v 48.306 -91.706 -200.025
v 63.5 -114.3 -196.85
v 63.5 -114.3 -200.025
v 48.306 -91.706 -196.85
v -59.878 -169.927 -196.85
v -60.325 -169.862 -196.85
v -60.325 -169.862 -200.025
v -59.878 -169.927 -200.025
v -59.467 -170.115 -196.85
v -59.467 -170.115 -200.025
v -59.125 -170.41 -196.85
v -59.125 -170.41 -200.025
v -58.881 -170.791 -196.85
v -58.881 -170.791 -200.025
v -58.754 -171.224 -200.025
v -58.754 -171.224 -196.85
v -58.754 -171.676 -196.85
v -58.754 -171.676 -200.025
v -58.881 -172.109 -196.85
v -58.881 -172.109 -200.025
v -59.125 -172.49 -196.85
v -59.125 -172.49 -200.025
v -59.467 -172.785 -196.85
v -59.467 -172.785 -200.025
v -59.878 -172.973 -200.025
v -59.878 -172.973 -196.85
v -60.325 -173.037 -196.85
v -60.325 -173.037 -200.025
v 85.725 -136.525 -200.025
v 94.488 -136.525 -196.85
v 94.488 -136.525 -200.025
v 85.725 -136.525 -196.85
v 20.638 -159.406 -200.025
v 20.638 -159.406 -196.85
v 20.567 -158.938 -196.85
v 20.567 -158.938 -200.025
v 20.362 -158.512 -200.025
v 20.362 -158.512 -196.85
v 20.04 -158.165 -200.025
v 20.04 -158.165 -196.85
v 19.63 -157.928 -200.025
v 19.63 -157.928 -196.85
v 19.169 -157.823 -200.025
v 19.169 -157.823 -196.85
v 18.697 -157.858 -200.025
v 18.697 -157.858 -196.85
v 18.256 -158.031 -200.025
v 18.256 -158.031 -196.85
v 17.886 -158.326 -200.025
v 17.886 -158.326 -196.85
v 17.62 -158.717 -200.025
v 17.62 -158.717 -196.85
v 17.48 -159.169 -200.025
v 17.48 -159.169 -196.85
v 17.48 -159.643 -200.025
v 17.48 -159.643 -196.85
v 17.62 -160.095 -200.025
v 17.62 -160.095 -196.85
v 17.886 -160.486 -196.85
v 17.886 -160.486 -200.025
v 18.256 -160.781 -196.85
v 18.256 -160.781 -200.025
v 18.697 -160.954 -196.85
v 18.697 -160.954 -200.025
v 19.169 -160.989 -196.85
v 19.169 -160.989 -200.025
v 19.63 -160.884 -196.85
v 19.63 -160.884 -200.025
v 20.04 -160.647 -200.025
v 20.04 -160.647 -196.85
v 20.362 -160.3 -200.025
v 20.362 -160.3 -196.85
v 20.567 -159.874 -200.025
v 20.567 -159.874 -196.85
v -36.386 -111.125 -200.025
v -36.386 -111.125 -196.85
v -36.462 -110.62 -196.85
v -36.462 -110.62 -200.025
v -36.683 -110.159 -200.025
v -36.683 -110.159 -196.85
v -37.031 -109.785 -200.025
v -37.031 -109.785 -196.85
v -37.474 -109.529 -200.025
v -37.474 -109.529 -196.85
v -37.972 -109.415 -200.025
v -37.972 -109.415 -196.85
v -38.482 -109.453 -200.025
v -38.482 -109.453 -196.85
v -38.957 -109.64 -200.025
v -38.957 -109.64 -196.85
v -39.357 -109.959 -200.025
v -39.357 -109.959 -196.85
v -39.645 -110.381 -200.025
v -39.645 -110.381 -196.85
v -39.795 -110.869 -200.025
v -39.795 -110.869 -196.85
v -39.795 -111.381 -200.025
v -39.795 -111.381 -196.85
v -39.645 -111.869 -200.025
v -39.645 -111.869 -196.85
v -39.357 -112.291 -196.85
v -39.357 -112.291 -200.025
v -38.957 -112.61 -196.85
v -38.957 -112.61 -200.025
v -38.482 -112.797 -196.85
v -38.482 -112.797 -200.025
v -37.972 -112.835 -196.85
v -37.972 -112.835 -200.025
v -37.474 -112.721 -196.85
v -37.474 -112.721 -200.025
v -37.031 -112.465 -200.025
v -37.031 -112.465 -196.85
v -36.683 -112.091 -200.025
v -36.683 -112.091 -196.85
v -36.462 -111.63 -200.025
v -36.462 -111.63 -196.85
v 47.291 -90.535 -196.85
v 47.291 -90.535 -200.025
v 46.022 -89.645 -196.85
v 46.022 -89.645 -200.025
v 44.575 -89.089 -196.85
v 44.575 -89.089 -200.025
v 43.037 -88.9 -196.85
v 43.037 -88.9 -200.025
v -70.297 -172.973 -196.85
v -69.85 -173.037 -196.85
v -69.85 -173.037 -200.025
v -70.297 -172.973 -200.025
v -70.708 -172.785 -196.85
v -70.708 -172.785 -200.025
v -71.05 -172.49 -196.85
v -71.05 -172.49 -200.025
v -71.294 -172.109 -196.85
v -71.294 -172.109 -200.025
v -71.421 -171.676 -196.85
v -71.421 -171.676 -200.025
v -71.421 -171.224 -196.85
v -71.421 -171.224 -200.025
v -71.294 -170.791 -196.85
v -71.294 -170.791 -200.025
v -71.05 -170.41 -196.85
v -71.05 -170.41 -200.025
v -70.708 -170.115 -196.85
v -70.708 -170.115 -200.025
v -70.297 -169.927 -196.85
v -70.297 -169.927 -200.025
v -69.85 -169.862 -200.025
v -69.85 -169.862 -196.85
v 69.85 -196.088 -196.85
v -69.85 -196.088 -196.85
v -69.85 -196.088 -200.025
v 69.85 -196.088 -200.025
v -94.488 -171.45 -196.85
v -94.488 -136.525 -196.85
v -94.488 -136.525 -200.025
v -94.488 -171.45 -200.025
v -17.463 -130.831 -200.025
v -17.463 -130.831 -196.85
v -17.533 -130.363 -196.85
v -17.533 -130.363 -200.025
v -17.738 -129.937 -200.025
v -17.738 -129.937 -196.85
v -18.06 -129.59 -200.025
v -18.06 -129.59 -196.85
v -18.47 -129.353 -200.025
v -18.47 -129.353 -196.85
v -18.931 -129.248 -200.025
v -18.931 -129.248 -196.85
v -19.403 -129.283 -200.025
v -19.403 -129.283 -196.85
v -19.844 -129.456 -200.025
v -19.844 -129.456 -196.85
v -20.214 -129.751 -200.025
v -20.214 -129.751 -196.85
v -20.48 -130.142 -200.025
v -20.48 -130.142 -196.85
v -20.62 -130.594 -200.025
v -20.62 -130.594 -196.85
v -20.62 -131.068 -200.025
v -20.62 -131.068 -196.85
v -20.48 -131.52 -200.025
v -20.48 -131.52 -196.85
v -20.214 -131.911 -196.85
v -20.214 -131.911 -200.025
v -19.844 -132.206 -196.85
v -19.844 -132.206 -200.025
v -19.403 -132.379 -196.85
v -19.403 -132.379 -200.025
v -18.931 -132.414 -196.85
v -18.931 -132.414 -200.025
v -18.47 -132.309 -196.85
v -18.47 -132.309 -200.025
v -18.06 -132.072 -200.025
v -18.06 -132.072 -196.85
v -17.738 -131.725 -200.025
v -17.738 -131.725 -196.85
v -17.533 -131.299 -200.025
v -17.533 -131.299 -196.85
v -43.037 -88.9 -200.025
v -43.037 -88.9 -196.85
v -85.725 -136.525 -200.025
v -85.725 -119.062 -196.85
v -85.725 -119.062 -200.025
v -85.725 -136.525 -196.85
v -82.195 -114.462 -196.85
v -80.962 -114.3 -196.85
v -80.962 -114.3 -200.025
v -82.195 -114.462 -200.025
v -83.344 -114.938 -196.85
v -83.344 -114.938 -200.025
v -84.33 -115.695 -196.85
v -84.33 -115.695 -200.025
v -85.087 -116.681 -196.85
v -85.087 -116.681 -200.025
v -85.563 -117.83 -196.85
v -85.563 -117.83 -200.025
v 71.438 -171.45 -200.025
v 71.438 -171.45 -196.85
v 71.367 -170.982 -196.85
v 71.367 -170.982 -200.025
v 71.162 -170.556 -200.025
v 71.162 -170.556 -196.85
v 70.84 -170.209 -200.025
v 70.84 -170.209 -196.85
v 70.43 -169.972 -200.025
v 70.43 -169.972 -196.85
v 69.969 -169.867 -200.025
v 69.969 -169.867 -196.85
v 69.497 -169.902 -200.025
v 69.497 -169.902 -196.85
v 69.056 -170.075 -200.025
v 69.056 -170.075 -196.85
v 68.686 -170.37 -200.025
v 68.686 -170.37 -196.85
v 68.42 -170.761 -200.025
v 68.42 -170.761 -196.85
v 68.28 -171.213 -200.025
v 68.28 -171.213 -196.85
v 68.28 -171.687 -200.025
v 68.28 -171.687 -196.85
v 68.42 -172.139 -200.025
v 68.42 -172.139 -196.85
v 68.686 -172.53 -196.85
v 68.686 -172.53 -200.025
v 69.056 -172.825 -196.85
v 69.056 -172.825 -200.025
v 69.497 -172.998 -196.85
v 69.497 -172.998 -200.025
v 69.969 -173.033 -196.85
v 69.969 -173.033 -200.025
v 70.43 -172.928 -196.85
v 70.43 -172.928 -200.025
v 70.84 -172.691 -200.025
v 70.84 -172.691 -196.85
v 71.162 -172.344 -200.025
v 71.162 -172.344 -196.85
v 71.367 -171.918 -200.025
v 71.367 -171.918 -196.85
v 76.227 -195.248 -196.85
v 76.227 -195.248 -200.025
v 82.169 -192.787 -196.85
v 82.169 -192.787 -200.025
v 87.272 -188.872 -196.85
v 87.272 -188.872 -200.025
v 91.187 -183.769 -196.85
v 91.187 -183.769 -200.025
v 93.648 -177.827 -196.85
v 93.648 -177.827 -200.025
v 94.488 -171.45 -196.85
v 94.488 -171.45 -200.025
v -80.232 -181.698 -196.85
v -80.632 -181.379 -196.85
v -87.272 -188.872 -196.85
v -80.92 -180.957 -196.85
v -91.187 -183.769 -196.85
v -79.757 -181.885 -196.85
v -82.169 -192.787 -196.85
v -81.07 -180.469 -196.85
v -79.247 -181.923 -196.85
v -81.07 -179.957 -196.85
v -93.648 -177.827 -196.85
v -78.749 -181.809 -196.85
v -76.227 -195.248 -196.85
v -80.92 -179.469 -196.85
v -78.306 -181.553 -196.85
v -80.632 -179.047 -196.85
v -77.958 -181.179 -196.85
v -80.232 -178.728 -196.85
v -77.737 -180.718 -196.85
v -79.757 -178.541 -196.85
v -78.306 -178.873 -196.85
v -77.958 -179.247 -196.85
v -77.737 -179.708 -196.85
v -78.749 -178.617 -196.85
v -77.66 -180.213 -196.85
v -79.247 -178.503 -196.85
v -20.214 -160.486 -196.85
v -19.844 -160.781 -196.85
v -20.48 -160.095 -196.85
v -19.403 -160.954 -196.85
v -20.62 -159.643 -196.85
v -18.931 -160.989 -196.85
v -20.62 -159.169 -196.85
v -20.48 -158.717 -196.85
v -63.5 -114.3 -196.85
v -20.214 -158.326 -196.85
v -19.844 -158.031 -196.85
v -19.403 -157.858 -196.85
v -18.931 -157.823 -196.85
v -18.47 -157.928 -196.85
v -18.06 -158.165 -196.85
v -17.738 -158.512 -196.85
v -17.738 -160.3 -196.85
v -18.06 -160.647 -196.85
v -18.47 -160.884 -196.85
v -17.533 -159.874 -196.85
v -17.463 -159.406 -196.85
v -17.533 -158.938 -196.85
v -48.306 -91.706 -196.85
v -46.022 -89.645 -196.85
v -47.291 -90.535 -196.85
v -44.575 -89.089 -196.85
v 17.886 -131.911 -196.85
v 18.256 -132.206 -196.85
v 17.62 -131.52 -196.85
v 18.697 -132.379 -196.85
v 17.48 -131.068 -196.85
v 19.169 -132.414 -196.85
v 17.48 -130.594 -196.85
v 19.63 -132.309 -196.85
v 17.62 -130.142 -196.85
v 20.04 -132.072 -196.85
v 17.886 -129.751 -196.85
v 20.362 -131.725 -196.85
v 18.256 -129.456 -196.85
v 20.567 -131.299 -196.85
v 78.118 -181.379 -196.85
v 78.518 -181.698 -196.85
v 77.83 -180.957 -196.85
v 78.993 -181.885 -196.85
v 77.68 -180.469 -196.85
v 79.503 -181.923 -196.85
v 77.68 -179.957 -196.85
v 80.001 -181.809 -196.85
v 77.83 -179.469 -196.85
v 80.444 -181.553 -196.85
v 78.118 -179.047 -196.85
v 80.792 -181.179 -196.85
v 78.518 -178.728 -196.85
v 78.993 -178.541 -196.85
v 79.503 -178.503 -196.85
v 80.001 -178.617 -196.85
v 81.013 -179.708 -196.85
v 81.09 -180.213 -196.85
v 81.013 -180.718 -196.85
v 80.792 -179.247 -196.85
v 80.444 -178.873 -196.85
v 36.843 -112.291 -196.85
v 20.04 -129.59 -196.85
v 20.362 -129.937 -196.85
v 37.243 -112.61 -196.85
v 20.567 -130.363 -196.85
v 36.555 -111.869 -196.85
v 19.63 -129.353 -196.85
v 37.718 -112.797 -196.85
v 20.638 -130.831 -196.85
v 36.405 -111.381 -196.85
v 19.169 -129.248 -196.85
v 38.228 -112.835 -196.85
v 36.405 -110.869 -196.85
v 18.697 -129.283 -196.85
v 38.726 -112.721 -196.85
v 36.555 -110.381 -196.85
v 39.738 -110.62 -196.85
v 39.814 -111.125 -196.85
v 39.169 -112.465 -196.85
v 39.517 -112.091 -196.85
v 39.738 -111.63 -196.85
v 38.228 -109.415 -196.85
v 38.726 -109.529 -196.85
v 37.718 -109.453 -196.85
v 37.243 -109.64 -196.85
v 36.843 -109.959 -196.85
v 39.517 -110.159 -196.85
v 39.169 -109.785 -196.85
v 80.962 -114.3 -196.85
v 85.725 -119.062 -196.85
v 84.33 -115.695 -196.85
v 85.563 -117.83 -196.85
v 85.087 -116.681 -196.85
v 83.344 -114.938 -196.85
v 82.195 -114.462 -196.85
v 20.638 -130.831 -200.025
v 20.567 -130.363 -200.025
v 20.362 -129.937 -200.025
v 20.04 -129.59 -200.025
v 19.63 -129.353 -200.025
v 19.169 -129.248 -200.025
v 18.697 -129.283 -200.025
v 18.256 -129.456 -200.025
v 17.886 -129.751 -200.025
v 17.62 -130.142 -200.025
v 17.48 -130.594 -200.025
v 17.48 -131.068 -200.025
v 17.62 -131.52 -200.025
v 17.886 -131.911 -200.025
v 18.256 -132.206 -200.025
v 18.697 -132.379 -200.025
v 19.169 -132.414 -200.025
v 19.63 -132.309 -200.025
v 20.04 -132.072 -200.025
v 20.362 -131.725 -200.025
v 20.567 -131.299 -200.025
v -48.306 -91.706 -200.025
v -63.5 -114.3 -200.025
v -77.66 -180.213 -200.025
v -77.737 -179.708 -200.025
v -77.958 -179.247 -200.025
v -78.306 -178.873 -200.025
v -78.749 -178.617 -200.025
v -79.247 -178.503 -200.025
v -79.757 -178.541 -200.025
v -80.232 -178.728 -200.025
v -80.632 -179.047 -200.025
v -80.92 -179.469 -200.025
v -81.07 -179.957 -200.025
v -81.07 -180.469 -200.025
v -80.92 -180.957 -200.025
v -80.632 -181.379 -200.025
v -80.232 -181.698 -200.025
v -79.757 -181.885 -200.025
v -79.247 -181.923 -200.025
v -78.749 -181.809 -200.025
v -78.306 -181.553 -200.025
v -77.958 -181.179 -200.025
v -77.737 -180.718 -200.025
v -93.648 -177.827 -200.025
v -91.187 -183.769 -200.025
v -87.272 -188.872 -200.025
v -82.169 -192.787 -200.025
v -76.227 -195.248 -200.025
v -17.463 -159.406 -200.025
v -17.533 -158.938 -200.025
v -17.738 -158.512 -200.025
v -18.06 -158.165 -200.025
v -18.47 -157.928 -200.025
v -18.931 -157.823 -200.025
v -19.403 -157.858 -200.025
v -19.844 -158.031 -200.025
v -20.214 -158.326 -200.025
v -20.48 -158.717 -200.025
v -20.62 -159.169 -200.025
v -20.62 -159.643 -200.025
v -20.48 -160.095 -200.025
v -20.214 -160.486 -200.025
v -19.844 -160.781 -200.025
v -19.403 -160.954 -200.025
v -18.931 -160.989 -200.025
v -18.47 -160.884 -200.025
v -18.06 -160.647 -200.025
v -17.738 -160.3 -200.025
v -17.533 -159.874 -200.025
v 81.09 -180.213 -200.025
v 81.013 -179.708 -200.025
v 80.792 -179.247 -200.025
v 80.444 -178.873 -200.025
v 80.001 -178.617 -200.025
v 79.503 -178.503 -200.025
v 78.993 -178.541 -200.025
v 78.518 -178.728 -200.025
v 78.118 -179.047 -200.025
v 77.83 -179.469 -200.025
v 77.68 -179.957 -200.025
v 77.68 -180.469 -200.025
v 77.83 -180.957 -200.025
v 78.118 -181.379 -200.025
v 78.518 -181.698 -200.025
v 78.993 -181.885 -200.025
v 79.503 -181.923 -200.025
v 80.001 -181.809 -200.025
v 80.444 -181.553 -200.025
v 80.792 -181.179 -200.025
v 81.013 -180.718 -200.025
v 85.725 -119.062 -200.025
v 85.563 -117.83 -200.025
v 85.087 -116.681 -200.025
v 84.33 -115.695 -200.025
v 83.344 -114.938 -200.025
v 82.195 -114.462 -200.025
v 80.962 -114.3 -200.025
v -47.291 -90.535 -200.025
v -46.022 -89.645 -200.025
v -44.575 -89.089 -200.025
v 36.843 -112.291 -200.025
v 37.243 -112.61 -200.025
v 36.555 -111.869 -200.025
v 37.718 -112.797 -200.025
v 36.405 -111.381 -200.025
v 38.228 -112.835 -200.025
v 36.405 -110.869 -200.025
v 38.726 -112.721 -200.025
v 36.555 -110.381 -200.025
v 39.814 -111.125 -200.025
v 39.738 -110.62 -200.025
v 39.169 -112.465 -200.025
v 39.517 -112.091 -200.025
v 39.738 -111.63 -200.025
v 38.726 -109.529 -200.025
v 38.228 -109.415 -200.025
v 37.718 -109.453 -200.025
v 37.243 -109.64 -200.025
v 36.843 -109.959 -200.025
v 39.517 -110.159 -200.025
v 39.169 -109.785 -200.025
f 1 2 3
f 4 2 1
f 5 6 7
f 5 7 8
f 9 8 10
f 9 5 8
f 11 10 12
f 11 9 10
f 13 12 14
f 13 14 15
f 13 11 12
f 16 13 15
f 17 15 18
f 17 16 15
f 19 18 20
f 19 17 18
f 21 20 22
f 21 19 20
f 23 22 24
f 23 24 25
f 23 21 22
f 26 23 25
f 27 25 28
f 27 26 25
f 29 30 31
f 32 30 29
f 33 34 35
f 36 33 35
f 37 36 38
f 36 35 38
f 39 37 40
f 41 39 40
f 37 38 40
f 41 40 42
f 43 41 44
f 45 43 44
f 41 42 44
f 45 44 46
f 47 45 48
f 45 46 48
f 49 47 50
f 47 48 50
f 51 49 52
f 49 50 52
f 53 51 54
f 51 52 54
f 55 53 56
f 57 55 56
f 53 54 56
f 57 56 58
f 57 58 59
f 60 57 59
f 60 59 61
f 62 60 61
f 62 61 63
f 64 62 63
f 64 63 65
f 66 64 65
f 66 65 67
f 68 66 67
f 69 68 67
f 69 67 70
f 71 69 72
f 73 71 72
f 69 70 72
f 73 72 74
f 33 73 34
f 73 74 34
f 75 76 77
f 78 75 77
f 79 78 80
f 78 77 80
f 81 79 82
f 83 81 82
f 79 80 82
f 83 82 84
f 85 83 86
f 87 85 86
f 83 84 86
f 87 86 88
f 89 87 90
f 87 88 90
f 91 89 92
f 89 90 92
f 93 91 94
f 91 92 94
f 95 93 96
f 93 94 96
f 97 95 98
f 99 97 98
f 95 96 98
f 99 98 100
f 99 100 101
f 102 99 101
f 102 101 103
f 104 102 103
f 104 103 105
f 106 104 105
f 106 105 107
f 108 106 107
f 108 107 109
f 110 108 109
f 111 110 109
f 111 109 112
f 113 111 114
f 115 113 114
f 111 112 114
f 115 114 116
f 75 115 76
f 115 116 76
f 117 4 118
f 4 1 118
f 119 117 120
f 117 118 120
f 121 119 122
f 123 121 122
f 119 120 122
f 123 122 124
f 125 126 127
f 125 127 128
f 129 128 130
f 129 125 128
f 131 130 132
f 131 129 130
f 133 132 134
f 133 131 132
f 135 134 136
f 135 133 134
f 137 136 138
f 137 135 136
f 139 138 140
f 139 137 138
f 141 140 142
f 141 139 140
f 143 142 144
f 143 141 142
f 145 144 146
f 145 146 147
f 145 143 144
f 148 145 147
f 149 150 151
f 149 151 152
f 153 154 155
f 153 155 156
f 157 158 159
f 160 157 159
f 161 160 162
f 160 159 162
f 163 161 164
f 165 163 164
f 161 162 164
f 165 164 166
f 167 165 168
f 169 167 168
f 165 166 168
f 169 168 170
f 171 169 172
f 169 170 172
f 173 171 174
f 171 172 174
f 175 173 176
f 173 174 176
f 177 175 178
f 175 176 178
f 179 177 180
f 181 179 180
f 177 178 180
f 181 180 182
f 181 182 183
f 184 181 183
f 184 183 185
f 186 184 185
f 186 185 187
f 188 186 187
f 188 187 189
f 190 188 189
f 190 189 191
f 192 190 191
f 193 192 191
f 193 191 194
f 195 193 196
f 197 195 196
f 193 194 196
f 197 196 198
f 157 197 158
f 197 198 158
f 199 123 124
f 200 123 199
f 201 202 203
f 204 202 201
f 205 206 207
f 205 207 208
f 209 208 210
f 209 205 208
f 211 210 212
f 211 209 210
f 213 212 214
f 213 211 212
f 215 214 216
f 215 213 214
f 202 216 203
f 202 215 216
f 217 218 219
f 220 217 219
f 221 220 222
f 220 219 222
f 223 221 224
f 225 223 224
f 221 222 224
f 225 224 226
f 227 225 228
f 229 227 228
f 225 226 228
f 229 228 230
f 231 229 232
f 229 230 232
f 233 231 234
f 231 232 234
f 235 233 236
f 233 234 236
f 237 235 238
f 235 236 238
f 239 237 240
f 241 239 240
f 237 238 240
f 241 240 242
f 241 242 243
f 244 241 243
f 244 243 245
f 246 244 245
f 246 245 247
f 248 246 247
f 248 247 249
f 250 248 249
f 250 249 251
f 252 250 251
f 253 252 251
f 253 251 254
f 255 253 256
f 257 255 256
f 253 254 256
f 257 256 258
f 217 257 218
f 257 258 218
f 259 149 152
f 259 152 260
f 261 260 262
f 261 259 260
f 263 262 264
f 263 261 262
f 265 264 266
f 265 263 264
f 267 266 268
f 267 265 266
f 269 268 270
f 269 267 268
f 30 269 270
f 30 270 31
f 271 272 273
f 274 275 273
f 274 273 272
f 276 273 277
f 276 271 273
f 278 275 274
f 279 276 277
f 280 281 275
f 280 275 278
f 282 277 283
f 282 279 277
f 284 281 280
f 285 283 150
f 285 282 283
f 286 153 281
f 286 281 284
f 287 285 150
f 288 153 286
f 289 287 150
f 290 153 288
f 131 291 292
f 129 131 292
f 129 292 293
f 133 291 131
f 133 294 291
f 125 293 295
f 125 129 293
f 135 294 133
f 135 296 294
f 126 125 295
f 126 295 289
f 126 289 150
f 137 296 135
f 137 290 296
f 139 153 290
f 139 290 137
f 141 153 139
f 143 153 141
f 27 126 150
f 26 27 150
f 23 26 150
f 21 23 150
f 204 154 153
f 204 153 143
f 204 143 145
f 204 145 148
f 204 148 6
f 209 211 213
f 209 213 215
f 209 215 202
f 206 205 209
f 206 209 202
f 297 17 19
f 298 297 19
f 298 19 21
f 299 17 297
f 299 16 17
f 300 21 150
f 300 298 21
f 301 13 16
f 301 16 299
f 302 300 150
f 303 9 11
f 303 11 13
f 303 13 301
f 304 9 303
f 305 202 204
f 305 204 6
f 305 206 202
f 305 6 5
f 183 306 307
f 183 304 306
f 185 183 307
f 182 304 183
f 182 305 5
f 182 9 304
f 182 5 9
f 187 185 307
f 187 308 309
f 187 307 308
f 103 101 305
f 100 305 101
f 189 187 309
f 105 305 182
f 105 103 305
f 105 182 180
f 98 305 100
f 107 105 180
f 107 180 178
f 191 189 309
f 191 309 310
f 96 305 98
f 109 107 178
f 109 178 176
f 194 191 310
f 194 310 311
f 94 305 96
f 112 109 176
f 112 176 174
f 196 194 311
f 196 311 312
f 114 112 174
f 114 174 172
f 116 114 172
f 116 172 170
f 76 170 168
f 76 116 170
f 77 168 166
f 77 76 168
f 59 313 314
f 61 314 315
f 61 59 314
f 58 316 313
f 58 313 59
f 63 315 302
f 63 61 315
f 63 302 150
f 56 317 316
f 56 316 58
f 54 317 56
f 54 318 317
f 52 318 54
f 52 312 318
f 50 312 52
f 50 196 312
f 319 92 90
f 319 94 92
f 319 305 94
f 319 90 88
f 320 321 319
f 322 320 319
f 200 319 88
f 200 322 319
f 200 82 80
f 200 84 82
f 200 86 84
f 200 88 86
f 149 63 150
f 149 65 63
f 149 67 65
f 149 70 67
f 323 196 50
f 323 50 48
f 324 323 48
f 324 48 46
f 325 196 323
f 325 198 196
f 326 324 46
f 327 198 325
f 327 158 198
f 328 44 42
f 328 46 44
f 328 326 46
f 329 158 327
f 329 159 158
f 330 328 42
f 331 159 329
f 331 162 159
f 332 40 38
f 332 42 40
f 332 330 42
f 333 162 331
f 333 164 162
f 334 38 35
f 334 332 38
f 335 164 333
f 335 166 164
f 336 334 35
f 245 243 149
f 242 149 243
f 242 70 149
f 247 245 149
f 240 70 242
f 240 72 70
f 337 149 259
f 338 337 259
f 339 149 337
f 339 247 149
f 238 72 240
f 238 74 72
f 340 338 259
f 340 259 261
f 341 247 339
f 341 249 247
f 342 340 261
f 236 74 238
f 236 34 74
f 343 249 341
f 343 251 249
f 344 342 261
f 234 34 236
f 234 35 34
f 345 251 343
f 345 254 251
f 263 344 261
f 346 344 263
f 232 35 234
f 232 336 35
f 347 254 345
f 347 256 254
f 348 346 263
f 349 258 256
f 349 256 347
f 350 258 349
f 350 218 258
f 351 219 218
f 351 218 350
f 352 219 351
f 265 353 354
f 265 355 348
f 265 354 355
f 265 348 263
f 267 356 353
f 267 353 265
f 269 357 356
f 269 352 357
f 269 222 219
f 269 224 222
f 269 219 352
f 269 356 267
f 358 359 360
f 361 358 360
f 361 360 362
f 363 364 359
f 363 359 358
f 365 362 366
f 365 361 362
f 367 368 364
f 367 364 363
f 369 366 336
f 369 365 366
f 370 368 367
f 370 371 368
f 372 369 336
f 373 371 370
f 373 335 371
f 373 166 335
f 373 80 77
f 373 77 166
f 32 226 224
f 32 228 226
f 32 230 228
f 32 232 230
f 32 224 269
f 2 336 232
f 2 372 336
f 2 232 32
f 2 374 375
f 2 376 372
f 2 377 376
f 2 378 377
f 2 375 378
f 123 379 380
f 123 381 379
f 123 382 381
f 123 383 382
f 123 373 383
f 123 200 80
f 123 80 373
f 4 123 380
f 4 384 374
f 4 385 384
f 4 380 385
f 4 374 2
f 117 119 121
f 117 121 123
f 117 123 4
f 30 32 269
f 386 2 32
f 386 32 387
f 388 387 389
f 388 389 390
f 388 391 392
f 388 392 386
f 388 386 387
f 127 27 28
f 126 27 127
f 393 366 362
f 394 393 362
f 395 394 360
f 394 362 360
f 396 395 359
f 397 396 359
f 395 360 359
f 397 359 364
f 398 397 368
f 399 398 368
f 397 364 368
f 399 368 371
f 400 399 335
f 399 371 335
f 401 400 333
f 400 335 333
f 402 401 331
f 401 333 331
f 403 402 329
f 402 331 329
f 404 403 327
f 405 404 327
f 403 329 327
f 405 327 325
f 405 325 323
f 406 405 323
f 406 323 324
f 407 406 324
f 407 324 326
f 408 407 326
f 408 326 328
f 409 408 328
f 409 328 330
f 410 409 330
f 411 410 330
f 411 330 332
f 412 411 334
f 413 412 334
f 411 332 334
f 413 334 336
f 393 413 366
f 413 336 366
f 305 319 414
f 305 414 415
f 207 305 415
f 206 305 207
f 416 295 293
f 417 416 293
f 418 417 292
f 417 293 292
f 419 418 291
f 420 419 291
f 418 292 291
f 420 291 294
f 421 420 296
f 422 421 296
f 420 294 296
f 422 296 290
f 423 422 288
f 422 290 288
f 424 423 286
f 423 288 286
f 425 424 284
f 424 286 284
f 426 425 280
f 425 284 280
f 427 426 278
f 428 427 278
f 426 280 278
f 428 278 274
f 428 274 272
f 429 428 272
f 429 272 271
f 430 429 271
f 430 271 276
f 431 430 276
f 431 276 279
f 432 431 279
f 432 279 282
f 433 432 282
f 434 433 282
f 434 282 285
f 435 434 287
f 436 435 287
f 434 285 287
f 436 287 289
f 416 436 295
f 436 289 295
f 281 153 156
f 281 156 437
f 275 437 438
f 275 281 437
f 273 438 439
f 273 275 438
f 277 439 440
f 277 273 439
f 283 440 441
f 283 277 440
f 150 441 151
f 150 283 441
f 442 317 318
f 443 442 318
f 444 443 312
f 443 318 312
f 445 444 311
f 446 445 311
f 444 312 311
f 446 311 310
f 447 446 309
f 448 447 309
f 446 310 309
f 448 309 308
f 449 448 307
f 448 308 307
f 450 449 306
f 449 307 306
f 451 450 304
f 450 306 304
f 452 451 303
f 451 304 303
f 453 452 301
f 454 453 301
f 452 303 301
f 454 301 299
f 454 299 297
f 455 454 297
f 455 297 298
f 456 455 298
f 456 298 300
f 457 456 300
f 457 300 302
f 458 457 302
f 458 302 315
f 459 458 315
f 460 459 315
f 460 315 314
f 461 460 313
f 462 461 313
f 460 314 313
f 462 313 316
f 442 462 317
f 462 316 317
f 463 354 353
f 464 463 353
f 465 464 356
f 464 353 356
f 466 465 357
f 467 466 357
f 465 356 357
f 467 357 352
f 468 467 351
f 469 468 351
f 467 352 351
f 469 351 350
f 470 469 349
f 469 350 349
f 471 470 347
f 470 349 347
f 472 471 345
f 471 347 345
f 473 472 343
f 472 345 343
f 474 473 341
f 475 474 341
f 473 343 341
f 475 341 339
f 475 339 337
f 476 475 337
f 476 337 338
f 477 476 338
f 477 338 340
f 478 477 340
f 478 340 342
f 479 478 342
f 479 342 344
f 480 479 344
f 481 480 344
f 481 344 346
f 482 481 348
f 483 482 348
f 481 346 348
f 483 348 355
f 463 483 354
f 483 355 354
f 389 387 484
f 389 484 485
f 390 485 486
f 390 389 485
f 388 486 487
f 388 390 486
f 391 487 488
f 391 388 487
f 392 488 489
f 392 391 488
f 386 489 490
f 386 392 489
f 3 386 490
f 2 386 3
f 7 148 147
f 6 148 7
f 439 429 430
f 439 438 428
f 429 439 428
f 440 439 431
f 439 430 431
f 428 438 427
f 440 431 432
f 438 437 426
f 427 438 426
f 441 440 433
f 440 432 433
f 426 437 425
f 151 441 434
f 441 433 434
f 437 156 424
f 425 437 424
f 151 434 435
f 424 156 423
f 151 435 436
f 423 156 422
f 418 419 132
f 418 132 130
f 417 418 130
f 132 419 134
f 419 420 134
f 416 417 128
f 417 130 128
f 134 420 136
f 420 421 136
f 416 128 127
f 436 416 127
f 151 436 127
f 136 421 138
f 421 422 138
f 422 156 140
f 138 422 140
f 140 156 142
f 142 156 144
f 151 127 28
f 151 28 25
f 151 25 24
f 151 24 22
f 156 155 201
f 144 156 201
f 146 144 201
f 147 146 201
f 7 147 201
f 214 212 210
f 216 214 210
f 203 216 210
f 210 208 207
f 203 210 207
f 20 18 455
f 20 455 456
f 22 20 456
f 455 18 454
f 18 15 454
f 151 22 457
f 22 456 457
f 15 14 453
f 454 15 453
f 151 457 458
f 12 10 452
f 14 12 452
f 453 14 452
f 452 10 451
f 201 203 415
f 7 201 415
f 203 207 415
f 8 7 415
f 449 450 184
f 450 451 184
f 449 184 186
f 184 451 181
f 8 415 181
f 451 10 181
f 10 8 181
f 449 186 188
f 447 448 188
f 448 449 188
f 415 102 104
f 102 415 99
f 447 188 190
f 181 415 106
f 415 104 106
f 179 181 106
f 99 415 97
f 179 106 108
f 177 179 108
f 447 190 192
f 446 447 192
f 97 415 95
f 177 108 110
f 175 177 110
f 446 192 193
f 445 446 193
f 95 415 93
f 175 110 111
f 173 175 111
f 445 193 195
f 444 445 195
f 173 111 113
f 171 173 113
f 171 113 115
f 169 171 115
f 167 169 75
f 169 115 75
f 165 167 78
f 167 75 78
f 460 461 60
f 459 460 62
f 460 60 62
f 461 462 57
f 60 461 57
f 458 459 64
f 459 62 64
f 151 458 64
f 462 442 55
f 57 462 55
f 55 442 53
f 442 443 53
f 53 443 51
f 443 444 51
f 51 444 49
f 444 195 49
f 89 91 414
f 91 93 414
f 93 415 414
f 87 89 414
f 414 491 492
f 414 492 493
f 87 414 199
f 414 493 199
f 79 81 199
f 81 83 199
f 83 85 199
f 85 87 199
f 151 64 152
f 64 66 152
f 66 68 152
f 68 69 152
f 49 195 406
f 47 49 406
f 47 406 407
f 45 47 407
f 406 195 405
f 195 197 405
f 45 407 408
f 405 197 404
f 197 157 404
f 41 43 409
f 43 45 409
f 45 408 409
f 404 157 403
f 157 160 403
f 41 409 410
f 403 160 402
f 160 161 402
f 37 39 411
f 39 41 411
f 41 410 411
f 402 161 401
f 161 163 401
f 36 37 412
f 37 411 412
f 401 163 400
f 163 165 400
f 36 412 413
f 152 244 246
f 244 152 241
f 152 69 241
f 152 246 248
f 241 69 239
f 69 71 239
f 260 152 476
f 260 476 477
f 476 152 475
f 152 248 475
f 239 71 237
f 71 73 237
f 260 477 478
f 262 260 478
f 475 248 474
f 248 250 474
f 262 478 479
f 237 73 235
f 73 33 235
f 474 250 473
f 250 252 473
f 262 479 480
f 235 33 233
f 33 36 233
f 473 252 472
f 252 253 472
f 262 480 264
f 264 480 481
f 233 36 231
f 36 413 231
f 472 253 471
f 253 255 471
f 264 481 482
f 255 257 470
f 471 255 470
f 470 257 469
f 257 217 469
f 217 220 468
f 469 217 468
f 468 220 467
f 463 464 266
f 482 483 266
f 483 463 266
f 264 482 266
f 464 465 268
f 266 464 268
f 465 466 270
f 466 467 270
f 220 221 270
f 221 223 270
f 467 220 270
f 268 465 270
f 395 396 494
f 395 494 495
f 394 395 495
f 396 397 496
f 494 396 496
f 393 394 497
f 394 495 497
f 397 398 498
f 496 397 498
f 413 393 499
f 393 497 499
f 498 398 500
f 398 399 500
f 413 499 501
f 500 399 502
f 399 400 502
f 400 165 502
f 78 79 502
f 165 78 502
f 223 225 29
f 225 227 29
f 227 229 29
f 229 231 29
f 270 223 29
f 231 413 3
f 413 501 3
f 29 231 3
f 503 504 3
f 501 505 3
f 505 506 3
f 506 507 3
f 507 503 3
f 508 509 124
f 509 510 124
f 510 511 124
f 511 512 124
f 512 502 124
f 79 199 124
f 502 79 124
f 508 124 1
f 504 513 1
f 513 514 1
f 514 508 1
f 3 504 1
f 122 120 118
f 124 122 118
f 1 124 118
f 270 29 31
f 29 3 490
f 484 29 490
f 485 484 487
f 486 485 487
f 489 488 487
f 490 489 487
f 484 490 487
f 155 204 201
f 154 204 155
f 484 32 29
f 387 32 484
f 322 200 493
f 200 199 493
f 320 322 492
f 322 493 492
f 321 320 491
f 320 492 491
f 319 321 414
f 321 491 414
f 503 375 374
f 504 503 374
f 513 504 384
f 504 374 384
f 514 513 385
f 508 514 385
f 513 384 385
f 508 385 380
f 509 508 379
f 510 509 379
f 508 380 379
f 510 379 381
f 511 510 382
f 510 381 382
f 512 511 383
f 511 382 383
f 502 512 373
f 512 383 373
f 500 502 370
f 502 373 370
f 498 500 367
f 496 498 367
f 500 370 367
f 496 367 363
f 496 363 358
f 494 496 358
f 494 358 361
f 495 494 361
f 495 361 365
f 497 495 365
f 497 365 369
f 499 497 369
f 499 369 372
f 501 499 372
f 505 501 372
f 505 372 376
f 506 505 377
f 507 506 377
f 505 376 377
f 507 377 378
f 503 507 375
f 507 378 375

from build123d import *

# Parameters (mm, degrees)
SKETCH1_R           = 1.7145
SKETCH1_R_2         = 1.5875
BOSS_EXTRUDE1_DEPTH = 3.175
FILLET1_R           = 6.35


with BuildPart() as part:
    # Sketch1 → Boss-Extrude1 (new body)
    with BuildSketch(Plane.XY.offset(-196.85)):
        with BuildLine():
            Line((63.5, -114.3), (46.418820715, -88.9))
            Line((46.418820715, -88.9), (-46.418820715, -88.9))
            Line((-46.418820715, -88.9), (-63.5, -114.3))
            Line((-63.5, -114.3), (-80.9625, -114.3))
            ThreePointArc((-80.9625, -114.3), (-84.330096045, -115.694903955), (-85.725, -119.0625))
            Line((-85.725, -119.0625), (-85.725, -136.525))
            Line((-85.725, -136.525), (-94.488, -136.525))
            Line((-94.488, -136.525), (-94.488, -171.45))
            ThreePointArc((-94.488, -171.45), (-87.271696875, -188.871696875), (-69.85, -196.088))
            Line((-69.85, -196.088), (69.85, -196.088))
            ThreePointArc((69.85, -196.088), (87.271696875, -188.871696875), (94.488, -171.45))
            Line((94.488, -171.45), (94.488, -136.525))
            Line((94.488, -136.525), (85.725, -136.525))
            Line((85.725, -136.525), (85.725, -119.0625))
            ThreePointArc((85.725, -119.0625), (84.330096045, -115.694903955), (80.9625, -114.3))
            Line((80.9625, -114.3), (63.5, -114.3))
        make_face()
        with Locations((-79.375, -180.213)):
            Circle(SKETCH1_R, mode=Mode.SUBTRACT)
        with BuildLine():
            ThreePointArc((-69.85, -173.0375), (-71.4375, -171.45), (-69.85, -169.8625))
            Line((-69.85, -169.8625), (-60.325, -169.8625))
            ThreePointArc((-60.325, -169.8625), (-58.7375, -171.45), (-60.325, -173.0375))
            Line((-60.325, -173.0375), (-69.85, -173.0375))
        make_face(mode=Mode.SUBTRACT)
        with Locations((-19.05, -159.40600326)):
            Circle(SKETCH1_R_2, mode=Mode.SUBTRACT)
        with Locations((-19.05, -130.83100326)):
            Circle(SKETCH1_R_2, mode=Mode.SUBTRACT)
        with Locations((-38.1, -111.125)):
            Circle(SKETCH1_R, mode=Mode.SUBTRACT)
        with Locations((19.05, -159.40600326)):
            Circle(SKETCH1_R_2, mode=Mode.SUBTRACT)
        with Locations((79.375, -180.213)):
            Circle(SKETCH1_R, mode=Mode.SUBTRACT)
        with Locations((69.85, -171.45)):
            Circle(SKETCH1_R_2, mode=Mode.SUBTRACT)
        with Locations((19.05, -130.83100326)):
            Circle(SKETCH1_R_2, mode=Mode.SUBTRACT)
        with Locations((38.1, -111.125)):
            Circle(SKETCH1_R, mode=Mode.SUBTRACT)
    extrude(amount=-BOSS_EXTRUDE1_DEPTH)

    # Fillet1
    fillet1_edges = [part.edges().sort_by_distance(p)[0] for p in [
        (-46.418820715, -88.9, -198.4375),
        (46.418820715, -88.9, -198.4375),
    ]]
    fillet(fillet1_edges, radius=FILLET1_R)


solid = part.part
